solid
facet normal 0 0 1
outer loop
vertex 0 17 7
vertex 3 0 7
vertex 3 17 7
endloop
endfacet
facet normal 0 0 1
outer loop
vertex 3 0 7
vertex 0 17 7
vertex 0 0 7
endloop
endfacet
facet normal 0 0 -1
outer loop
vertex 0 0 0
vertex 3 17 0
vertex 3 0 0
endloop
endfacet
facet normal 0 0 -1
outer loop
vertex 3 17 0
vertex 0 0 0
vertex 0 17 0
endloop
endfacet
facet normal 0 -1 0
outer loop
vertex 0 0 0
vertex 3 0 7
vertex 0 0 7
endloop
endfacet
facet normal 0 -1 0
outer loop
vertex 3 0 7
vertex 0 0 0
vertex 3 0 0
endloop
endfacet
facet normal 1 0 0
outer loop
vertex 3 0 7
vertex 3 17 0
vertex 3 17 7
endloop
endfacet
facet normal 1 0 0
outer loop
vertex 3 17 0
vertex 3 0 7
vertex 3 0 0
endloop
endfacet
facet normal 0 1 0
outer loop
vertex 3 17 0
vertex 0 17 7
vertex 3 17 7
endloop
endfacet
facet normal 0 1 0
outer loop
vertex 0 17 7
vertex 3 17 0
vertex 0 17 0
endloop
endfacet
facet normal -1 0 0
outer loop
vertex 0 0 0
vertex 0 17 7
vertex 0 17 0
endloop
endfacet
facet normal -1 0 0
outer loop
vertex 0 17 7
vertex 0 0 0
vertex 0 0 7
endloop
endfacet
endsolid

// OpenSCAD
// Generated by SolidPython 1.0.1 on 2020-07-29 00:46:54


cube(size = [3, 17, 7]);
/***********************************************
*********      SolidPython code:      **********
************************************************
 
# import packages: SolidPython
from solid import *
from solid.utils import *
from itertools import chain, combinations, permutations


class Resize:

    def __init__(self, scad_file):
        self.scad_file = scad_file
        #self.scad_file = import_scad(scad_file)
        # cone/cylinder param:
        self.r1 = 0
        self.r2 = 0
        self.h = 0
        # rectangular prism param:
        self.w = 0
        self.l = 0
        # ellipse param:
        self.r = 0

    # import OpenScad code (file name corresponds to shape)


    # classify shape + parameters
    def assign(self, param1, param2, param3):
        if self.scad_file == 'cone.scad':
            self.r1 = param1
            self.r2 = param2
            self.h = param3
        elif self.scad_file == 'cylinder.scad':
            self.r1 = param1
            self.r2 = param2
            self.h = param3
        elif self.scad_file == 'rectangularPrism.scad':
            self.h = param1
            self.l = param2
            self.w = param3
        else:
            self.r = param1
            self.h = param2

    # resize parameters
    def iterate(self):
        x = range(3, 20, 2)
        i = 1
        if self.scad_file == 'cone.scad':
            tempList = list(permutations(x, 2))
            for temp in tempList:
                param1 = temp[0]
                param2 = temp[1]
                filepath = 'produced_scad_files/' + 'cone' + str(param1) + '_' + str(param2) + '_' + '.scad'
                scad_render_to_file(cylinder(h=param1, r1=param2, r2=0), filepath)

        elif self.scad_file == 'cylinder.scad':
            tempList = list(permutations(x, 3))
            for temp in tempList:
                param1 = temp[0]
                param2 = temp[1]
                filepath = 'produced_scad_files/' + 'cylinder' + str(param1) + '_' + str(param2) + '_' + '.scad'
                scad_render_to_file(cylinder(h=param1, r1=param2, r2=param2), filepath)

        elif self.scad_file == 'rectangularPrism.scad':
            tempList = list(permutations(x, 3))
            for temp in tempList:
                param1 = temp[0]
                param2 = temp[1]
                param3 = temp[2]
                filepath = 'produced_scad_files/' + 'rectangularPrism' + str(param1) + '_' + str(param2) + '_' + str(
                    param3) + '.scad'
                scad_render_to_file(cube(size=(param1, param2, param3)), filepath)

        elif self.scad_file == 'ellipse.scad':
            tempList = list(permutations(x, 4))
            for temp in tempList:
                param1 = temp[0]
                param2 = temp[1]
                param3 = temp[2]
                param4 = temp[3]
                filepath = 'produced_scad_files/' + 'ellipse' + str(param1) + '_' + str(param2) + '_' + str(param3) + '_' + str(param4) + '.scad'
                scad_render_to_file(scale([param1, param2, param3])(sphere(r=param4)), filepath)

    def render_to_scadfile(self):
        scad_render_to_file(scad, 'example.scad') 
 
************************************************/
